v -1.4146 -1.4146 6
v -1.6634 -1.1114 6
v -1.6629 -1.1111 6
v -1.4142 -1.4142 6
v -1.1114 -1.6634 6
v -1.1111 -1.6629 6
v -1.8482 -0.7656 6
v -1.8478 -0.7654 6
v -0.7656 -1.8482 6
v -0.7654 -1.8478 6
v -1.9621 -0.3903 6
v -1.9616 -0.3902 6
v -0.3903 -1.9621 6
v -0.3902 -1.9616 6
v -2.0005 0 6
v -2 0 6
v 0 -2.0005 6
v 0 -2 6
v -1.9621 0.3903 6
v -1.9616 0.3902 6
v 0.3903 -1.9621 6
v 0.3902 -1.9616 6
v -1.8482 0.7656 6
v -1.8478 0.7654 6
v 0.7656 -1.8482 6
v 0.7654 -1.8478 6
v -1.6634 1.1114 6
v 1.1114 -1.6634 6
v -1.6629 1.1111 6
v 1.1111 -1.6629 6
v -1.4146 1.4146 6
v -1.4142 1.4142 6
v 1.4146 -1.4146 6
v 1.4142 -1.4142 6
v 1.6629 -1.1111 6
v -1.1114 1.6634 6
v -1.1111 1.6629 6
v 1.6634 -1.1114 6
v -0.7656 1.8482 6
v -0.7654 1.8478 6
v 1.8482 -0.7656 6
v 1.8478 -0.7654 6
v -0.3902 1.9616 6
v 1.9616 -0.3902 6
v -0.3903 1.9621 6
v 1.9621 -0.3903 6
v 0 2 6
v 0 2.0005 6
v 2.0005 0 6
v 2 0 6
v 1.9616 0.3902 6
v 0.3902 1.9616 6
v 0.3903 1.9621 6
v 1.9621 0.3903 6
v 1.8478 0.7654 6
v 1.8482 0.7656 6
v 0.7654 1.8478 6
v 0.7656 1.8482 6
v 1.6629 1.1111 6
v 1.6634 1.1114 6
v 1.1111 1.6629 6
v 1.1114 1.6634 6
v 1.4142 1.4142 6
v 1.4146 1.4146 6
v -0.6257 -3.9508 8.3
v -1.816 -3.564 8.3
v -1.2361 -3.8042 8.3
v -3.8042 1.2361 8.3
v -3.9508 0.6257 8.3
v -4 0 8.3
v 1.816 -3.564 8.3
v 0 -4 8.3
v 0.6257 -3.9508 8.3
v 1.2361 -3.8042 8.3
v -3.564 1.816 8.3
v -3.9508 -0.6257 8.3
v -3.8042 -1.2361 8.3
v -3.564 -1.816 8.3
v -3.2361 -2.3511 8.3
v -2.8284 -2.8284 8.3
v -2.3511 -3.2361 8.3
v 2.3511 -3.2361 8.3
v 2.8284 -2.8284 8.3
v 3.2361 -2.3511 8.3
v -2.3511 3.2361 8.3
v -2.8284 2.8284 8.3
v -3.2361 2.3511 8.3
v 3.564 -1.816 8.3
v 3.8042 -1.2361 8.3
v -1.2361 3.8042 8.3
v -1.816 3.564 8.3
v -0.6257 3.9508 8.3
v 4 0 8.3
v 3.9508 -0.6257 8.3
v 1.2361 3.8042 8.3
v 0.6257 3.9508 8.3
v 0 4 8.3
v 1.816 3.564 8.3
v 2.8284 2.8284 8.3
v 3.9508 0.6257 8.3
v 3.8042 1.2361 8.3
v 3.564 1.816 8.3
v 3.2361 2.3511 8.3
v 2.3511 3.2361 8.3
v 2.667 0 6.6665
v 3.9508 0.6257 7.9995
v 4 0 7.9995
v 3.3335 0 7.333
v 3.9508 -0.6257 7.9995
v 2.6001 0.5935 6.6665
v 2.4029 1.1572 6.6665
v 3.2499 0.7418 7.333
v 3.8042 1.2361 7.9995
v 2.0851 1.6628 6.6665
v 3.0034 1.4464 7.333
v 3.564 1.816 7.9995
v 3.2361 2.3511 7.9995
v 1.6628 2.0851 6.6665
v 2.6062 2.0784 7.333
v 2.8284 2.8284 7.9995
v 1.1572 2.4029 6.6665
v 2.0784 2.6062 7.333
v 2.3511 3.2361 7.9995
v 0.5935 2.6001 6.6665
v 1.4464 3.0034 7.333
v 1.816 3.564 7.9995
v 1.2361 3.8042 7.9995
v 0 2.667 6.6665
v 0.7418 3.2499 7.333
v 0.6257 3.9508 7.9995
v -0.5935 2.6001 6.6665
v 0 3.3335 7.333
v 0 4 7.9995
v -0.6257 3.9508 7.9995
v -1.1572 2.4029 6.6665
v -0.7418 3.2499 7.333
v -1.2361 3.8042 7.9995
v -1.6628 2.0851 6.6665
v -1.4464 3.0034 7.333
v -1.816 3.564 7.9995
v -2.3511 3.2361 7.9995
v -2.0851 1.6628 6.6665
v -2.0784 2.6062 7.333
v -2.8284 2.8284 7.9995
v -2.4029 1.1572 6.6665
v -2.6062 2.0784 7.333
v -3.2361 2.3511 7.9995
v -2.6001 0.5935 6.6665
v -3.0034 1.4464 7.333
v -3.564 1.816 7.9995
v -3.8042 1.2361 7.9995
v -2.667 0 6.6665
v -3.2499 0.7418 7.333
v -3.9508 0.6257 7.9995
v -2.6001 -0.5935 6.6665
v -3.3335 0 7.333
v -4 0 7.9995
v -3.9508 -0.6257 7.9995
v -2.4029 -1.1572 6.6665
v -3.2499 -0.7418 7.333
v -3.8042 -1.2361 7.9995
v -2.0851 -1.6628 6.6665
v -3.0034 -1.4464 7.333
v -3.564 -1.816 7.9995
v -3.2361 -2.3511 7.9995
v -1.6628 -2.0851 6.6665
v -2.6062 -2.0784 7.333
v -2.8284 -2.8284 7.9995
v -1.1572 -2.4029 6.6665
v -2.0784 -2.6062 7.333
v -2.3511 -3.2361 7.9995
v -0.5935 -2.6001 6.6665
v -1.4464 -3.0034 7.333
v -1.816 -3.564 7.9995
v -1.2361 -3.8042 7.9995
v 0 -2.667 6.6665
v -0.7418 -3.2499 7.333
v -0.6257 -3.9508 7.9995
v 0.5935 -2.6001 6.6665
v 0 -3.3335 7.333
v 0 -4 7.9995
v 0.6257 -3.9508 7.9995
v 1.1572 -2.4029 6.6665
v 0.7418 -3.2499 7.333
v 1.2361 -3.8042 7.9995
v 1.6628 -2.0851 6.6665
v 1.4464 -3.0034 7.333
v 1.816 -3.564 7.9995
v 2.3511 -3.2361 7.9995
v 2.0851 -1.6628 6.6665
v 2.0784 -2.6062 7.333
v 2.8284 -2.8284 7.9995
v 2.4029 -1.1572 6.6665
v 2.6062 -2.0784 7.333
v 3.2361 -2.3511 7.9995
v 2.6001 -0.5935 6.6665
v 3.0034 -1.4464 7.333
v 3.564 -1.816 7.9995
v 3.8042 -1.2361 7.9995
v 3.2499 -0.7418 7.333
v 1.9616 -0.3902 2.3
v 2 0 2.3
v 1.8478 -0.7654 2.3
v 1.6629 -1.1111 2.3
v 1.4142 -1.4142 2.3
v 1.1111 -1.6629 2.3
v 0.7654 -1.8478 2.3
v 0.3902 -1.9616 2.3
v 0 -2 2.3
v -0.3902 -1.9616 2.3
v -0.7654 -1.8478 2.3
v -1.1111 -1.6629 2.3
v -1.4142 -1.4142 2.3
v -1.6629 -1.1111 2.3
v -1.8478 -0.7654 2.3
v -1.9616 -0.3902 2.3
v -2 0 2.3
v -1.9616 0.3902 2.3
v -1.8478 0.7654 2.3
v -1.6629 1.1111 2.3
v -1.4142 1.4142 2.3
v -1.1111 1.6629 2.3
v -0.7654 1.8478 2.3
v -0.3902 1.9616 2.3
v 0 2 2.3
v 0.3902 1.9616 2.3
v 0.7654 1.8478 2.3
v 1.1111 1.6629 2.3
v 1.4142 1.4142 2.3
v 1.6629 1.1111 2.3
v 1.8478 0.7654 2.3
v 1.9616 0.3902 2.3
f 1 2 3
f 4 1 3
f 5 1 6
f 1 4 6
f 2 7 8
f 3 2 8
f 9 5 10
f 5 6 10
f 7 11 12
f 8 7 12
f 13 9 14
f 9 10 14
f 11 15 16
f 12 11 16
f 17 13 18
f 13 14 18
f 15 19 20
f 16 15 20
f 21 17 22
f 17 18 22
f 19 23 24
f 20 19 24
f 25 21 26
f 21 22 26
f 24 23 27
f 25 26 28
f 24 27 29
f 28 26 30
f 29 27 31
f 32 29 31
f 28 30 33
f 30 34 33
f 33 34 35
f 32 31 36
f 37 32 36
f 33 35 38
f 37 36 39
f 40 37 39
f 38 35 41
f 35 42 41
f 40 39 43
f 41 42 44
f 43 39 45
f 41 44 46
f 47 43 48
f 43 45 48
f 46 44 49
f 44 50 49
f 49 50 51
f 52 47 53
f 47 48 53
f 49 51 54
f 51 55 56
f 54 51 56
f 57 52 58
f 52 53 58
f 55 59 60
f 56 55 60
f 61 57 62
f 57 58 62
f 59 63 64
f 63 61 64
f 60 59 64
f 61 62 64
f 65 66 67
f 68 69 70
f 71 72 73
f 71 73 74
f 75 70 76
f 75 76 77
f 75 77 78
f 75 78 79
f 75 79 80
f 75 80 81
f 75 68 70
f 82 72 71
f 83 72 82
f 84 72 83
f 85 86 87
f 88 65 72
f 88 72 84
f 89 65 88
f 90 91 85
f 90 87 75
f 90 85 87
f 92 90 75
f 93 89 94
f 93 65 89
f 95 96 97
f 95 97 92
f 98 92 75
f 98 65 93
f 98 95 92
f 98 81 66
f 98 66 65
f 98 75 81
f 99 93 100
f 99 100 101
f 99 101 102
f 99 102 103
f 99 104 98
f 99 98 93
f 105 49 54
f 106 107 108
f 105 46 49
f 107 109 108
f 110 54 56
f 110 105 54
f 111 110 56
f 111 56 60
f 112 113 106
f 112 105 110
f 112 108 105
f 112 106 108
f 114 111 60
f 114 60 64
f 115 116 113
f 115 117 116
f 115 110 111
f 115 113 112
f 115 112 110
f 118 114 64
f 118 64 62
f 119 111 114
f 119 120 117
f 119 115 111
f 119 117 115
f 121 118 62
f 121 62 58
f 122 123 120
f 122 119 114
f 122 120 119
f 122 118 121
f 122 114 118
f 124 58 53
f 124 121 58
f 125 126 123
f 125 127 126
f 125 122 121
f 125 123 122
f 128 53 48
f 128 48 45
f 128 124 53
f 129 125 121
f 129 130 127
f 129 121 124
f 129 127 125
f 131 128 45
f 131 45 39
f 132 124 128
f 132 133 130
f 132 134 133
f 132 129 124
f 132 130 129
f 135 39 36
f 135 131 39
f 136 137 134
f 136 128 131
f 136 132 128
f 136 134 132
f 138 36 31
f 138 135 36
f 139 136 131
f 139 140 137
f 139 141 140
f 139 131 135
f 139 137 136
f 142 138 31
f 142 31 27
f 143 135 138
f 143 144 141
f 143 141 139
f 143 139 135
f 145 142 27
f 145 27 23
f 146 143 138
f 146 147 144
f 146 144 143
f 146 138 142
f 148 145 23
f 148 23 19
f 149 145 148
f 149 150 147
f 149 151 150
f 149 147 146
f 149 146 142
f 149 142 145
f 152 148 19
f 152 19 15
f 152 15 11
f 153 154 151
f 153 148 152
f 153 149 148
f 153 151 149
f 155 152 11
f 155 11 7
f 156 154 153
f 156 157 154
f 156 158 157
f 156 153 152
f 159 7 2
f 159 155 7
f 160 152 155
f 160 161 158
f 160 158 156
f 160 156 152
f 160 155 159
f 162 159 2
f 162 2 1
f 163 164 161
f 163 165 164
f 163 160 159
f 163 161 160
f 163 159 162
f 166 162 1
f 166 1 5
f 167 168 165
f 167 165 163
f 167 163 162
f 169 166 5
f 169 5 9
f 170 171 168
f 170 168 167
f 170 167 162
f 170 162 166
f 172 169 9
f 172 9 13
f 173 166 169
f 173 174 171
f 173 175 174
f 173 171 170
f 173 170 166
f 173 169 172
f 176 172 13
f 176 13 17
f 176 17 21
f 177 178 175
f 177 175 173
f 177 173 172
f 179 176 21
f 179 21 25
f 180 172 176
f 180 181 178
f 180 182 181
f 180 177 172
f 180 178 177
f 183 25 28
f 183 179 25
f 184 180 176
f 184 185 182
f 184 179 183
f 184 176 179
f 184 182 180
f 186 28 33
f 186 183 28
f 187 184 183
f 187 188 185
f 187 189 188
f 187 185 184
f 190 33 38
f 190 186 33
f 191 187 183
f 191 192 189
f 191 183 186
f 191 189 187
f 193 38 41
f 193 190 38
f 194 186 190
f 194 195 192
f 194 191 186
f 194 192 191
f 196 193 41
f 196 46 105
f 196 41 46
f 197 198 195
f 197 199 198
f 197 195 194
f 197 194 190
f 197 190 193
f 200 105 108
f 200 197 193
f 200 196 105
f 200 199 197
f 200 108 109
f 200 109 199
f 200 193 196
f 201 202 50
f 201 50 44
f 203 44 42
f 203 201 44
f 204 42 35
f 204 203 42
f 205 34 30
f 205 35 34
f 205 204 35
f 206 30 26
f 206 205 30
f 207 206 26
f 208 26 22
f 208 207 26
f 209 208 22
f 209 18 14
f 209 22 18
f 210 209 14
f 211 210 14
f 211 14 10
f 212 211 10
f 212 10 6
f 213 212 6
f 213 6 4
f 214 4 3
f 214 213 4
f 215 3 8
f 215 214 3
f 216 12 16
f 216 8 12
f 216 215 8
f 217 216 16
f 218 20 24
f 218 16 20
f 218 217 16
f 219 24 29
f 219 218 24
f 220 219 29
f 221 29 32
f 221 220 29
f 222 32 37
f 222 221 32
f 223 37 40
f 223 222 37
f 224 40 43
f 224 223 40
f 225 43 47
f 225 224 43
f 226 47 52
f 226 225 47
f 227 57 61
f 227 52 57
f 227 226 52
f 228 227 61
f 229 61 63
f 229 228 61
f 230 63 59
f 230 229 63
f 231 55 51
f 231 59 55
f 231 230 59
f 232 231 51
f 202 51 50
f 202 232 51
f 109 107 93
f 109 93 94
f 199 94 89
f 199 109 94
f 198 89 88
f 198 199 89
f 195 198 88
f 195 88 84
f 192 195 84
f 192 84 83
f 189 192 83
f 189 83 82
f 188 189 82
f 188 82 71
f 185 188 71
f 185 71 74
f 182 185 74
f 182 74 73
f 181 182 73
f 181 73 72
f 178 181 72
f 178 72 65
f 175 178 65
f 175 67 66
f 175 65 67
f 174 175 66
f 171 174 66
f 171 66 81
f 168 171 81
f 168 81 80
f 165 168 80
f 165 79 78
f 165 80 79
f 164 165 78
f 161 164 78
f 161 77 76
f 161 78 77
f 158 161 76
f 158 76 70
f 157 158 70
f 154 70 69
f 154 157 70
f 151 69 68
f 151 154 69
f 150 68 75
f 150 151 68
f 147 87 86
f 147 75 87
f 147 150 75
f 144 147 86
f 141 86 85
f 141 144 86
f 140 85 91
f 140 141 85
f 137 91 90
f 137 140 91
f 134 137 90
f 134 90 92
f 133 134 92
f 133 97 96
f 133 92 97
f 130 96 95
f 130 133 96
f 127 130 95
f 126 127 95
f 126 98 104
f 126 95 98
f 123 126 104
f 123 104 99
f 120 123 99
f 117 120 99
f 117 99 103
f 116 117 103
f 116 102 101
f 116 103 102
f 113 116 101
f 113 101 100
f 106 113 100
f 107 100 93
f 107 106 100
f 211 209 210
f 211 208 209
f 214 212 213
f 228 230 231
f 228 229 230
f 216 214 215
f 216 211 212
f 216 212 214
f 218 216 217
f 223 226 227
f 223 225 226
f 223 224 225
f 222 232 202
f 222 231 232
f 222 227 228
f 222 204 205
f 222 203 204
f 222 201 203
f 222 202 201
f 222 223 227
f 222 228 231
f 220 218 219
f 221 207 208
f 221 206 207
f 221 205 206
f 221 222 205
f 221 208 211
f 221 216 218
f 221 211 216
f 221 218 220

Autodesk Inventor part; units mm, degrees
ref_plane "YZ Plane" through (0, 0, 0) normal (1, 0, 0) x (0, 1, 0)
ref_plane "XZ Plane" through (0, 0, 0) normal (0, 1, 0) x (-1, 0, 0)
ref_plane "XY Plane" through (0, 0, 0) normal (0, 0, 1) x (1, 0, 0)
sketch "スケッチ1" plane through (0, 0, 0) normal (0, 0, 1) x (1, 0, 0)
  circle A0 centre (0, 0) radius 2
  dimension "d0" = 4
extrude "押し出し1" add sketch "スケッチ1" along normal blind 6
sketch "スケッチ2" plane through (0, 0, 6) normal (0, 0, 1) x (1, 0, 0)
  circle A0 centre (0, 0) radius 2 projected
  circle A1 centre (0, 0) radius 4
  dimension "d3" = 8
extrude "押し出し2" add sketch "スケッチ2" along normal blind 2.3 contours A0 | A1
thread "ねじ1" size "M4x0.7" class "6g" standard "ANSI Metric M Profile" full length
sketch "スケッチ3" plane through (0, 0, 0) normal (0, 0, -1) x (-1, 0, 0)
  circle A0 centre (0, 0) radius 2 projected
extrude "押し出し3" cut sketch "スケッチ3" against normal blind 2.3
chamfer "面取り1" distance 2 angle 45 1 edges at (-4, 0, 6)
properties part number "SB　M4 6mm 皿ネジ" material "Stainless Steel, 440C"
